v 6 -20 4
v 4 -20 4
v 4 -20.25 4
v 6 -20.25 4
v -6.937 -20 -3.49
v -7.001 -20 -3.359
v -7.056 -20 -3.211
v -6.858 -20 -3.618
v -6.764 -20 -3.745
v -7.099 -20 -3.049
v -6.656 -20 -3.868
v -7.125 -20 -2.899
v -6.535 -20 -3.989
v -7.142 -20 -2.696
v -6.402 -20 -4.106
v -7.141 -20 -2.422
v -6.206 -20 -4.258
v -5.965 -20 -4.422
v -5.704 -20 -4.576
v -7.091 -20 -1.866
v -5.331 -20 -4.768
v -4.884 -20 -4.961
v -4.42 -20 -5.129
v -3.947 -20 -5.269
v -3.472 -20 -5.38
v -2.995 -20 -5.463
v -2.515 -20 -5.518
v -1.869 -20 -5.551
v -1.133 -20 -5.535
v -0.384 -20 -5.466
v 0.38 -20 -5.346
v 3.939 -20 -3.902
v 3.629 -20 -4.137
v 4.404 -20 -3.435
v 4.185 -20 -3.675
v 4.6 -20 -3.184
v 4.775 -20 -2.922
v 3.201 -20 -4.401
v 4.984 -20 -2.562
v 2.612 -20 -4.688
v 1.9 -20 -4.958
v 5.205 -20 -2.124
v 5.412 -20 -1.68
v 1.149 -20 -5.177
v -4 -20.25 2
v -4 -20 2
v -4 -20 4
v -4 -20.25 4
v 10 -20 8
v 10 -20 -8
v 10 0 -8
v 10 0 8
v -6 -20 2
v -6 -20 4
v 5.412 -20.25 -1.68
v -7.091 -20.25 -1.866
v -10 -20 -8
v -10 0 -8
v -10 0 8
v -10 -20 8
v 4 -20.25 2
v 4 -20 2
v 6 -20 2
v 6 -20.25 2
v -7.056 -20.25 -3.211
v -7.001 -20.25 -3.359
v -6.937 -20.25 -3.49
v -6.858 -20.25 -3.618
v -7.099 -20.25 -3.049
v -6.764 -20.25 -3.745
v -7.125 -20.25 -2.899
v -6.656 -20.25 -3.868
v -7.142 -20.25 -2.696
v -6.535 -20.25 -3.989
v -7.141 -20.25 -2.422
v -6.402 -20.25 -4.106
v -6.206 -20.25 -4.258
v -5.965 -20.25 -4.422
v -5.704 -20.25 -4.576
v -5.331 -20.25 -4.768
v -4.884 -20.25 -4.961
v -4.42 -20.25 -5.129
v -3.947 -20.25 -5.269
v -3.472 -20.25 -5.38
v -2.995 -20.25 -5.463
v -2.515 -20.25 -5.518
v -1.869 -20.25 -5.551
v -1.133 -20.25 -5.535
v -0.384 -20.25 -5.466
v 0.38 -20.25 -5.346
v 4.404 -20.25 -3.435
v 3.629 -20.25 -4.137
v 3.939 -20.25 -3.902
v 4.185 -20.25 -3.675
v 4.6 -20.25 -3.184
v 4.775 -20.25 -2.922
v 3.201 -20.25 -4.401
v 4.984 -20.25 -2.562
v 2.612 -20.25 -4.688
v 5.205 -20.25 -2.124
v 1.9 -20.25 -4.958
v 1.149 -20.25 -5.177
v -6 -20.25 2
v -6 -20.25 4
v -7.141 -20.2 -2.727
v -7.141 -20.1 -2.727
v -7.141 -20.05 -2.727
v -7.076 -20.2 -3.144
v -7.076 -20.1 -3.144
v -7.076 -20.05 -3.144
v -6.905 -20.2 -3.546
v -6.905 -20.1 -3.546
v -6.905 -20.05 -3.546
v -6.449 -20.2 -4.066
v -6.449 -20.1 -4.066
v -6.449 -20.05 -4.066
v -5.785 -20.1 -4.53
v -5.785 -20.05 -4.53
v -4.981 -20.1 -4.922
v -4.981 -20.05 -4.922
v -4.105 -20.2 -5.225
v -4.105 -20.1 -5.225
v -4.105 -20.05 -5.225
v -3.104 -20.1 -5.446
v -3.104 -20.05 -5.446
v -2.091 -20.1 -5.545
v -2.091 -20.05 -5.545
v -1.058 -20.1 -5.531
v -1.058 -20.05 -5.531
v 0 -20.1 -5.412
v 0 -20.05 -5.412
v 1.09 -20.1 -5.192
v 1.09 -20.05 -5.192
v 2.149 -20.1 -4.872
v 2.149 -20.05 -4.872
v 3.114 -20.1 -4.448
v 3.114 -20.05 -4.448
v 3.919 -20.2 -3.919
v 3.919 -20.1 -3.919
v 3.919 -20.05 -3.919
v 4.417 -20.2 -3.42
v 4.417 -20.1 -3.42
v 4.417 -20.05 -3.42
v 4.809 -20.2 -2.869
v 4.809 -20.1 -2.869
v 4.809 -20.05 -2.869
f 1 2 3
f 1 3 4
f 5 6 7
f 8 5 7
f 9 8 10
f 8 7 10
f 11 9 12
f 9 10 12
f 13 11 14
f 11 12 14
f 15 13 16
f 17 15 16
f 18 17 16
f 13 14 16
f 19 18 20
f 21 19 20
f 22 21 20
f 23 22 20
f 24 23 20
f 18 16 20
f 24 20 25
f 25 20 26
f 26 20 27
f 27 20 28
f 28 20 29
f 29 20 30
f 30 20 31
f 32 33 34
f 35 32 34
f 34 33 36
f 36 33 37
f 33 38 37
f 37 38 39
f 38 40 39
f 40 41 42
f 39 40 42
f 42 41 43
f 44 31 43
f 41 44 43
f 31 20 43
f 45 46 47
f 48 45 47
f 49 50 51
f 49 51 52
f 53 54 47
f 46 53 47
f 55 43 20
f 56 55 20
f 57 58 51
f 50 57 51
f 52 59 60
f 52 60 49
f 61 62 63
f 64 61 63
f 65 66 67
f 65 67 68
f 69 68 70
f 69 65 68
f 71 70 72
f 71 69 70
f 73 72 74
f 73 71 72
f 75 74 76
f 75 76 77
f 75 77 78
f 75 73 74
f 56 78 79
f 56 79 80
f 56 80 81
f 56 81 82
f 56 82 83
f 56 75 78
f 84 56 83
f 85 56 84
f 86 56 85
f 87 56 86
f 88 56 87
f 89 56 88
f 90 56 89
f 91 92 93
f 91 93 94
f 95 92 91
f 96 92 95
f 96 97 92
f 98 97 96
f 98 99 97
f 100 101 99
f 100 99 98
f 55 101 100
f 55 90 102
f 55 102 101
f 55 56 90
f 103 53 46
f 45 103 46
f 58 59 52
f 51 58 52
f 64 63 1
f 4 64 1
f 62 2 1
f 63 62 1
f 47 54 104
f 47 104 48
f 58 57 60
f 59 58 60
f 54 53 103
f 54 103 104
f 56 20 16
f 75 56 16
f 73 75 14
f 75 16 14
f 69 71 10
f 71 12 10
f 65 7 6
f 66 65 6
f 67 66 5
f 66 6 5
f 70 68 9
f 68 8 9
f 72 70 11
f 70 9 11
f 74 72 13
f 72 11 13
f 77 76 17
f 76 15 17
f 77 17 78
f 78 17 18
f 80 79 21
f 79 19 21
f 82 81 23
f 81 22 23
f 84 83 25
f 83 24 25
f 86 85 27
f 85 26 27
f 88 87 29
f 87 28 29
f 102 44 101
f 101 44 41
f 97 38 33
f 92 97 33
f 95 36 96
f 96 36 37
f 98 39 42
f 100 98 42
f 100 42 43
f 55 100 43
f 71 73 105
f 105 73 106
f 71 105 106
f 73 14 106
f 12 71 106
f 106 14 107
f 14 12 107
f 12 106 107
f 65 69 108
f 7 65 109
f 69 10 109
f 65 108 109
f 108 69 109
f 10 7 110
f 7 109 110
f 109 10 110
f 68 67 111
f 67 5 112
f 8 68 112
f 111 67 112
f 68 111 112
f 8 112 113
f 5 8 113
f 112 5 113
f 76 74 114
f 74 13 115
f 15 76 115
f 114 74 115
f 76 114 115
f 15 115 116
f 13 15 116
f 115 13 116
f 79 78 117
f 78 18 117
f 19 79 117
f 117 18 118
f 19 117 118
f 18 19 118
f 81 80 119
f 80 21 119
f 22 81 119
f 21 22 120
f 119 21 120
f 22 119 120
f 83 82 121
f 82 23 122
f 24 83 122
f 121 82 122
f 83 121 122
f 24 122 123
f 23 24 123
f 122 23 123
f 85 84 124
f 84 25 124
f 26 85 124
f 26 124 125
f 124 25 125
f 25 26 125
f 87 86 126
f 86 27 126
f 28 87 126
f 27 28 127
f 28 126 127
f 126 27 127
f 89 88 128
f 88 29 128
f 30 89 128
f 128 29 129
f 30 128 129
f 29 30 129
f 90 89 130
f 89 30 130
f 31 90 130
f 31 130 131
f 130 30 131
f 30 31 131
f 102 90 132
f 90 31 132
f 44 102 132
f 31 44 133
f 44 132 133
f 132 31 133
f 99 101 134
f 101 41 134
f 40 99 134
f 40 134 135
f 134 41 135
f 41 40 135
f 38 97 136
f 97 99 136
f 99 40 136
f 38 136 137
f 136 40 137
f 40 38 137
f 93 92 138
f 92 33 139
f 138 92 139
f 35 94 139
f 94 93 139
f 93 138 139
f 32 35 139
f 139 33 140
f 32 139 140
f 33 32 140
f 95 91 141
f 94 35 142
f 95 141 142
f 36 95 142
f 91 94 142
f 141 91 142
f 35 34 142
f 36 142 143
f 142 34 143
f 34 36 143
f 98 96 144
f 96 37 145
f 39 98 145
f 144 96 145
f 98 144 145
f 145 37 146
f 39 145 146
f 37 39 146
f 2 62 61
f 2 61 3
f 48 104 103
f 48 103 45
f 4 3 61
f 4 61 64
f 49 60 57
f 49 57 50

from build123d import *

# Parameters (mm, degrees)
F0_W     = 20
F0_H     = 16
F1_DEPTH = 20
F2_W     = 2
F2_H     = 2
F3_DEPTH = 0.25
F5_DEPTH = 0.25


with BuildPart() as f1:
    # F0 (on Front) → F1 (new body)
    with BuildSketch(Plane.XZ):
        Rectangle(F0_W, F0_H)
    extrude(amount=F1_DEPTH)


with BuildPart() as f3:
    # F2 (on face) → F3 (new body)
    with BuildSketch(Plane.XZ.offset(20)):
        with Locations((5, 3)):
            Rectangle(F2_W, F2_H)
    extrude(amount=F3_DEPTH)


with BuildPart() as f3b:
    # F2 (on face) → F3, piece 2 (new body)
    with BuildSketch(Plane.XZ.offset(20)):
        with Locations((-5, 3)):
            Rectangle(F2_W, F2_H)
    extrude(amount=F3_DEPTH)


with BuildPart() as f5:
    # F4 (on face) → F5 (new body)
    with BuildSketch(Plane.XZ.offset(20)):
        with BuildLine():
            Line((5.4117310792, -1.679502544), (-7.0912330411, -1.8661138602))
            add(Edge.make_bspline(
                [(-7.0912330411, -1.8661138602), (-7.1559102468, -2.4449120118), (-7.3104809197, -3.8281693575), (-3.9732129095, -5.5770796248), (-0.0732200144, -5.6682157322), (4.2088757497, -4.3049709771), (5.0414241055, -2.4877703766), (5.4117310792, -1.679502544)],
                knots=[0, 0, 0, 0, 0.1473470695, 0.3521416156, 0.581927586, 0.8140466805, 1, 1, 1, 1], degree=3))
        make_face()
    extrude(amount=F5_DEPTH)


solid = Compound([f1.part, f3.part, f3b.part, f5.part])
